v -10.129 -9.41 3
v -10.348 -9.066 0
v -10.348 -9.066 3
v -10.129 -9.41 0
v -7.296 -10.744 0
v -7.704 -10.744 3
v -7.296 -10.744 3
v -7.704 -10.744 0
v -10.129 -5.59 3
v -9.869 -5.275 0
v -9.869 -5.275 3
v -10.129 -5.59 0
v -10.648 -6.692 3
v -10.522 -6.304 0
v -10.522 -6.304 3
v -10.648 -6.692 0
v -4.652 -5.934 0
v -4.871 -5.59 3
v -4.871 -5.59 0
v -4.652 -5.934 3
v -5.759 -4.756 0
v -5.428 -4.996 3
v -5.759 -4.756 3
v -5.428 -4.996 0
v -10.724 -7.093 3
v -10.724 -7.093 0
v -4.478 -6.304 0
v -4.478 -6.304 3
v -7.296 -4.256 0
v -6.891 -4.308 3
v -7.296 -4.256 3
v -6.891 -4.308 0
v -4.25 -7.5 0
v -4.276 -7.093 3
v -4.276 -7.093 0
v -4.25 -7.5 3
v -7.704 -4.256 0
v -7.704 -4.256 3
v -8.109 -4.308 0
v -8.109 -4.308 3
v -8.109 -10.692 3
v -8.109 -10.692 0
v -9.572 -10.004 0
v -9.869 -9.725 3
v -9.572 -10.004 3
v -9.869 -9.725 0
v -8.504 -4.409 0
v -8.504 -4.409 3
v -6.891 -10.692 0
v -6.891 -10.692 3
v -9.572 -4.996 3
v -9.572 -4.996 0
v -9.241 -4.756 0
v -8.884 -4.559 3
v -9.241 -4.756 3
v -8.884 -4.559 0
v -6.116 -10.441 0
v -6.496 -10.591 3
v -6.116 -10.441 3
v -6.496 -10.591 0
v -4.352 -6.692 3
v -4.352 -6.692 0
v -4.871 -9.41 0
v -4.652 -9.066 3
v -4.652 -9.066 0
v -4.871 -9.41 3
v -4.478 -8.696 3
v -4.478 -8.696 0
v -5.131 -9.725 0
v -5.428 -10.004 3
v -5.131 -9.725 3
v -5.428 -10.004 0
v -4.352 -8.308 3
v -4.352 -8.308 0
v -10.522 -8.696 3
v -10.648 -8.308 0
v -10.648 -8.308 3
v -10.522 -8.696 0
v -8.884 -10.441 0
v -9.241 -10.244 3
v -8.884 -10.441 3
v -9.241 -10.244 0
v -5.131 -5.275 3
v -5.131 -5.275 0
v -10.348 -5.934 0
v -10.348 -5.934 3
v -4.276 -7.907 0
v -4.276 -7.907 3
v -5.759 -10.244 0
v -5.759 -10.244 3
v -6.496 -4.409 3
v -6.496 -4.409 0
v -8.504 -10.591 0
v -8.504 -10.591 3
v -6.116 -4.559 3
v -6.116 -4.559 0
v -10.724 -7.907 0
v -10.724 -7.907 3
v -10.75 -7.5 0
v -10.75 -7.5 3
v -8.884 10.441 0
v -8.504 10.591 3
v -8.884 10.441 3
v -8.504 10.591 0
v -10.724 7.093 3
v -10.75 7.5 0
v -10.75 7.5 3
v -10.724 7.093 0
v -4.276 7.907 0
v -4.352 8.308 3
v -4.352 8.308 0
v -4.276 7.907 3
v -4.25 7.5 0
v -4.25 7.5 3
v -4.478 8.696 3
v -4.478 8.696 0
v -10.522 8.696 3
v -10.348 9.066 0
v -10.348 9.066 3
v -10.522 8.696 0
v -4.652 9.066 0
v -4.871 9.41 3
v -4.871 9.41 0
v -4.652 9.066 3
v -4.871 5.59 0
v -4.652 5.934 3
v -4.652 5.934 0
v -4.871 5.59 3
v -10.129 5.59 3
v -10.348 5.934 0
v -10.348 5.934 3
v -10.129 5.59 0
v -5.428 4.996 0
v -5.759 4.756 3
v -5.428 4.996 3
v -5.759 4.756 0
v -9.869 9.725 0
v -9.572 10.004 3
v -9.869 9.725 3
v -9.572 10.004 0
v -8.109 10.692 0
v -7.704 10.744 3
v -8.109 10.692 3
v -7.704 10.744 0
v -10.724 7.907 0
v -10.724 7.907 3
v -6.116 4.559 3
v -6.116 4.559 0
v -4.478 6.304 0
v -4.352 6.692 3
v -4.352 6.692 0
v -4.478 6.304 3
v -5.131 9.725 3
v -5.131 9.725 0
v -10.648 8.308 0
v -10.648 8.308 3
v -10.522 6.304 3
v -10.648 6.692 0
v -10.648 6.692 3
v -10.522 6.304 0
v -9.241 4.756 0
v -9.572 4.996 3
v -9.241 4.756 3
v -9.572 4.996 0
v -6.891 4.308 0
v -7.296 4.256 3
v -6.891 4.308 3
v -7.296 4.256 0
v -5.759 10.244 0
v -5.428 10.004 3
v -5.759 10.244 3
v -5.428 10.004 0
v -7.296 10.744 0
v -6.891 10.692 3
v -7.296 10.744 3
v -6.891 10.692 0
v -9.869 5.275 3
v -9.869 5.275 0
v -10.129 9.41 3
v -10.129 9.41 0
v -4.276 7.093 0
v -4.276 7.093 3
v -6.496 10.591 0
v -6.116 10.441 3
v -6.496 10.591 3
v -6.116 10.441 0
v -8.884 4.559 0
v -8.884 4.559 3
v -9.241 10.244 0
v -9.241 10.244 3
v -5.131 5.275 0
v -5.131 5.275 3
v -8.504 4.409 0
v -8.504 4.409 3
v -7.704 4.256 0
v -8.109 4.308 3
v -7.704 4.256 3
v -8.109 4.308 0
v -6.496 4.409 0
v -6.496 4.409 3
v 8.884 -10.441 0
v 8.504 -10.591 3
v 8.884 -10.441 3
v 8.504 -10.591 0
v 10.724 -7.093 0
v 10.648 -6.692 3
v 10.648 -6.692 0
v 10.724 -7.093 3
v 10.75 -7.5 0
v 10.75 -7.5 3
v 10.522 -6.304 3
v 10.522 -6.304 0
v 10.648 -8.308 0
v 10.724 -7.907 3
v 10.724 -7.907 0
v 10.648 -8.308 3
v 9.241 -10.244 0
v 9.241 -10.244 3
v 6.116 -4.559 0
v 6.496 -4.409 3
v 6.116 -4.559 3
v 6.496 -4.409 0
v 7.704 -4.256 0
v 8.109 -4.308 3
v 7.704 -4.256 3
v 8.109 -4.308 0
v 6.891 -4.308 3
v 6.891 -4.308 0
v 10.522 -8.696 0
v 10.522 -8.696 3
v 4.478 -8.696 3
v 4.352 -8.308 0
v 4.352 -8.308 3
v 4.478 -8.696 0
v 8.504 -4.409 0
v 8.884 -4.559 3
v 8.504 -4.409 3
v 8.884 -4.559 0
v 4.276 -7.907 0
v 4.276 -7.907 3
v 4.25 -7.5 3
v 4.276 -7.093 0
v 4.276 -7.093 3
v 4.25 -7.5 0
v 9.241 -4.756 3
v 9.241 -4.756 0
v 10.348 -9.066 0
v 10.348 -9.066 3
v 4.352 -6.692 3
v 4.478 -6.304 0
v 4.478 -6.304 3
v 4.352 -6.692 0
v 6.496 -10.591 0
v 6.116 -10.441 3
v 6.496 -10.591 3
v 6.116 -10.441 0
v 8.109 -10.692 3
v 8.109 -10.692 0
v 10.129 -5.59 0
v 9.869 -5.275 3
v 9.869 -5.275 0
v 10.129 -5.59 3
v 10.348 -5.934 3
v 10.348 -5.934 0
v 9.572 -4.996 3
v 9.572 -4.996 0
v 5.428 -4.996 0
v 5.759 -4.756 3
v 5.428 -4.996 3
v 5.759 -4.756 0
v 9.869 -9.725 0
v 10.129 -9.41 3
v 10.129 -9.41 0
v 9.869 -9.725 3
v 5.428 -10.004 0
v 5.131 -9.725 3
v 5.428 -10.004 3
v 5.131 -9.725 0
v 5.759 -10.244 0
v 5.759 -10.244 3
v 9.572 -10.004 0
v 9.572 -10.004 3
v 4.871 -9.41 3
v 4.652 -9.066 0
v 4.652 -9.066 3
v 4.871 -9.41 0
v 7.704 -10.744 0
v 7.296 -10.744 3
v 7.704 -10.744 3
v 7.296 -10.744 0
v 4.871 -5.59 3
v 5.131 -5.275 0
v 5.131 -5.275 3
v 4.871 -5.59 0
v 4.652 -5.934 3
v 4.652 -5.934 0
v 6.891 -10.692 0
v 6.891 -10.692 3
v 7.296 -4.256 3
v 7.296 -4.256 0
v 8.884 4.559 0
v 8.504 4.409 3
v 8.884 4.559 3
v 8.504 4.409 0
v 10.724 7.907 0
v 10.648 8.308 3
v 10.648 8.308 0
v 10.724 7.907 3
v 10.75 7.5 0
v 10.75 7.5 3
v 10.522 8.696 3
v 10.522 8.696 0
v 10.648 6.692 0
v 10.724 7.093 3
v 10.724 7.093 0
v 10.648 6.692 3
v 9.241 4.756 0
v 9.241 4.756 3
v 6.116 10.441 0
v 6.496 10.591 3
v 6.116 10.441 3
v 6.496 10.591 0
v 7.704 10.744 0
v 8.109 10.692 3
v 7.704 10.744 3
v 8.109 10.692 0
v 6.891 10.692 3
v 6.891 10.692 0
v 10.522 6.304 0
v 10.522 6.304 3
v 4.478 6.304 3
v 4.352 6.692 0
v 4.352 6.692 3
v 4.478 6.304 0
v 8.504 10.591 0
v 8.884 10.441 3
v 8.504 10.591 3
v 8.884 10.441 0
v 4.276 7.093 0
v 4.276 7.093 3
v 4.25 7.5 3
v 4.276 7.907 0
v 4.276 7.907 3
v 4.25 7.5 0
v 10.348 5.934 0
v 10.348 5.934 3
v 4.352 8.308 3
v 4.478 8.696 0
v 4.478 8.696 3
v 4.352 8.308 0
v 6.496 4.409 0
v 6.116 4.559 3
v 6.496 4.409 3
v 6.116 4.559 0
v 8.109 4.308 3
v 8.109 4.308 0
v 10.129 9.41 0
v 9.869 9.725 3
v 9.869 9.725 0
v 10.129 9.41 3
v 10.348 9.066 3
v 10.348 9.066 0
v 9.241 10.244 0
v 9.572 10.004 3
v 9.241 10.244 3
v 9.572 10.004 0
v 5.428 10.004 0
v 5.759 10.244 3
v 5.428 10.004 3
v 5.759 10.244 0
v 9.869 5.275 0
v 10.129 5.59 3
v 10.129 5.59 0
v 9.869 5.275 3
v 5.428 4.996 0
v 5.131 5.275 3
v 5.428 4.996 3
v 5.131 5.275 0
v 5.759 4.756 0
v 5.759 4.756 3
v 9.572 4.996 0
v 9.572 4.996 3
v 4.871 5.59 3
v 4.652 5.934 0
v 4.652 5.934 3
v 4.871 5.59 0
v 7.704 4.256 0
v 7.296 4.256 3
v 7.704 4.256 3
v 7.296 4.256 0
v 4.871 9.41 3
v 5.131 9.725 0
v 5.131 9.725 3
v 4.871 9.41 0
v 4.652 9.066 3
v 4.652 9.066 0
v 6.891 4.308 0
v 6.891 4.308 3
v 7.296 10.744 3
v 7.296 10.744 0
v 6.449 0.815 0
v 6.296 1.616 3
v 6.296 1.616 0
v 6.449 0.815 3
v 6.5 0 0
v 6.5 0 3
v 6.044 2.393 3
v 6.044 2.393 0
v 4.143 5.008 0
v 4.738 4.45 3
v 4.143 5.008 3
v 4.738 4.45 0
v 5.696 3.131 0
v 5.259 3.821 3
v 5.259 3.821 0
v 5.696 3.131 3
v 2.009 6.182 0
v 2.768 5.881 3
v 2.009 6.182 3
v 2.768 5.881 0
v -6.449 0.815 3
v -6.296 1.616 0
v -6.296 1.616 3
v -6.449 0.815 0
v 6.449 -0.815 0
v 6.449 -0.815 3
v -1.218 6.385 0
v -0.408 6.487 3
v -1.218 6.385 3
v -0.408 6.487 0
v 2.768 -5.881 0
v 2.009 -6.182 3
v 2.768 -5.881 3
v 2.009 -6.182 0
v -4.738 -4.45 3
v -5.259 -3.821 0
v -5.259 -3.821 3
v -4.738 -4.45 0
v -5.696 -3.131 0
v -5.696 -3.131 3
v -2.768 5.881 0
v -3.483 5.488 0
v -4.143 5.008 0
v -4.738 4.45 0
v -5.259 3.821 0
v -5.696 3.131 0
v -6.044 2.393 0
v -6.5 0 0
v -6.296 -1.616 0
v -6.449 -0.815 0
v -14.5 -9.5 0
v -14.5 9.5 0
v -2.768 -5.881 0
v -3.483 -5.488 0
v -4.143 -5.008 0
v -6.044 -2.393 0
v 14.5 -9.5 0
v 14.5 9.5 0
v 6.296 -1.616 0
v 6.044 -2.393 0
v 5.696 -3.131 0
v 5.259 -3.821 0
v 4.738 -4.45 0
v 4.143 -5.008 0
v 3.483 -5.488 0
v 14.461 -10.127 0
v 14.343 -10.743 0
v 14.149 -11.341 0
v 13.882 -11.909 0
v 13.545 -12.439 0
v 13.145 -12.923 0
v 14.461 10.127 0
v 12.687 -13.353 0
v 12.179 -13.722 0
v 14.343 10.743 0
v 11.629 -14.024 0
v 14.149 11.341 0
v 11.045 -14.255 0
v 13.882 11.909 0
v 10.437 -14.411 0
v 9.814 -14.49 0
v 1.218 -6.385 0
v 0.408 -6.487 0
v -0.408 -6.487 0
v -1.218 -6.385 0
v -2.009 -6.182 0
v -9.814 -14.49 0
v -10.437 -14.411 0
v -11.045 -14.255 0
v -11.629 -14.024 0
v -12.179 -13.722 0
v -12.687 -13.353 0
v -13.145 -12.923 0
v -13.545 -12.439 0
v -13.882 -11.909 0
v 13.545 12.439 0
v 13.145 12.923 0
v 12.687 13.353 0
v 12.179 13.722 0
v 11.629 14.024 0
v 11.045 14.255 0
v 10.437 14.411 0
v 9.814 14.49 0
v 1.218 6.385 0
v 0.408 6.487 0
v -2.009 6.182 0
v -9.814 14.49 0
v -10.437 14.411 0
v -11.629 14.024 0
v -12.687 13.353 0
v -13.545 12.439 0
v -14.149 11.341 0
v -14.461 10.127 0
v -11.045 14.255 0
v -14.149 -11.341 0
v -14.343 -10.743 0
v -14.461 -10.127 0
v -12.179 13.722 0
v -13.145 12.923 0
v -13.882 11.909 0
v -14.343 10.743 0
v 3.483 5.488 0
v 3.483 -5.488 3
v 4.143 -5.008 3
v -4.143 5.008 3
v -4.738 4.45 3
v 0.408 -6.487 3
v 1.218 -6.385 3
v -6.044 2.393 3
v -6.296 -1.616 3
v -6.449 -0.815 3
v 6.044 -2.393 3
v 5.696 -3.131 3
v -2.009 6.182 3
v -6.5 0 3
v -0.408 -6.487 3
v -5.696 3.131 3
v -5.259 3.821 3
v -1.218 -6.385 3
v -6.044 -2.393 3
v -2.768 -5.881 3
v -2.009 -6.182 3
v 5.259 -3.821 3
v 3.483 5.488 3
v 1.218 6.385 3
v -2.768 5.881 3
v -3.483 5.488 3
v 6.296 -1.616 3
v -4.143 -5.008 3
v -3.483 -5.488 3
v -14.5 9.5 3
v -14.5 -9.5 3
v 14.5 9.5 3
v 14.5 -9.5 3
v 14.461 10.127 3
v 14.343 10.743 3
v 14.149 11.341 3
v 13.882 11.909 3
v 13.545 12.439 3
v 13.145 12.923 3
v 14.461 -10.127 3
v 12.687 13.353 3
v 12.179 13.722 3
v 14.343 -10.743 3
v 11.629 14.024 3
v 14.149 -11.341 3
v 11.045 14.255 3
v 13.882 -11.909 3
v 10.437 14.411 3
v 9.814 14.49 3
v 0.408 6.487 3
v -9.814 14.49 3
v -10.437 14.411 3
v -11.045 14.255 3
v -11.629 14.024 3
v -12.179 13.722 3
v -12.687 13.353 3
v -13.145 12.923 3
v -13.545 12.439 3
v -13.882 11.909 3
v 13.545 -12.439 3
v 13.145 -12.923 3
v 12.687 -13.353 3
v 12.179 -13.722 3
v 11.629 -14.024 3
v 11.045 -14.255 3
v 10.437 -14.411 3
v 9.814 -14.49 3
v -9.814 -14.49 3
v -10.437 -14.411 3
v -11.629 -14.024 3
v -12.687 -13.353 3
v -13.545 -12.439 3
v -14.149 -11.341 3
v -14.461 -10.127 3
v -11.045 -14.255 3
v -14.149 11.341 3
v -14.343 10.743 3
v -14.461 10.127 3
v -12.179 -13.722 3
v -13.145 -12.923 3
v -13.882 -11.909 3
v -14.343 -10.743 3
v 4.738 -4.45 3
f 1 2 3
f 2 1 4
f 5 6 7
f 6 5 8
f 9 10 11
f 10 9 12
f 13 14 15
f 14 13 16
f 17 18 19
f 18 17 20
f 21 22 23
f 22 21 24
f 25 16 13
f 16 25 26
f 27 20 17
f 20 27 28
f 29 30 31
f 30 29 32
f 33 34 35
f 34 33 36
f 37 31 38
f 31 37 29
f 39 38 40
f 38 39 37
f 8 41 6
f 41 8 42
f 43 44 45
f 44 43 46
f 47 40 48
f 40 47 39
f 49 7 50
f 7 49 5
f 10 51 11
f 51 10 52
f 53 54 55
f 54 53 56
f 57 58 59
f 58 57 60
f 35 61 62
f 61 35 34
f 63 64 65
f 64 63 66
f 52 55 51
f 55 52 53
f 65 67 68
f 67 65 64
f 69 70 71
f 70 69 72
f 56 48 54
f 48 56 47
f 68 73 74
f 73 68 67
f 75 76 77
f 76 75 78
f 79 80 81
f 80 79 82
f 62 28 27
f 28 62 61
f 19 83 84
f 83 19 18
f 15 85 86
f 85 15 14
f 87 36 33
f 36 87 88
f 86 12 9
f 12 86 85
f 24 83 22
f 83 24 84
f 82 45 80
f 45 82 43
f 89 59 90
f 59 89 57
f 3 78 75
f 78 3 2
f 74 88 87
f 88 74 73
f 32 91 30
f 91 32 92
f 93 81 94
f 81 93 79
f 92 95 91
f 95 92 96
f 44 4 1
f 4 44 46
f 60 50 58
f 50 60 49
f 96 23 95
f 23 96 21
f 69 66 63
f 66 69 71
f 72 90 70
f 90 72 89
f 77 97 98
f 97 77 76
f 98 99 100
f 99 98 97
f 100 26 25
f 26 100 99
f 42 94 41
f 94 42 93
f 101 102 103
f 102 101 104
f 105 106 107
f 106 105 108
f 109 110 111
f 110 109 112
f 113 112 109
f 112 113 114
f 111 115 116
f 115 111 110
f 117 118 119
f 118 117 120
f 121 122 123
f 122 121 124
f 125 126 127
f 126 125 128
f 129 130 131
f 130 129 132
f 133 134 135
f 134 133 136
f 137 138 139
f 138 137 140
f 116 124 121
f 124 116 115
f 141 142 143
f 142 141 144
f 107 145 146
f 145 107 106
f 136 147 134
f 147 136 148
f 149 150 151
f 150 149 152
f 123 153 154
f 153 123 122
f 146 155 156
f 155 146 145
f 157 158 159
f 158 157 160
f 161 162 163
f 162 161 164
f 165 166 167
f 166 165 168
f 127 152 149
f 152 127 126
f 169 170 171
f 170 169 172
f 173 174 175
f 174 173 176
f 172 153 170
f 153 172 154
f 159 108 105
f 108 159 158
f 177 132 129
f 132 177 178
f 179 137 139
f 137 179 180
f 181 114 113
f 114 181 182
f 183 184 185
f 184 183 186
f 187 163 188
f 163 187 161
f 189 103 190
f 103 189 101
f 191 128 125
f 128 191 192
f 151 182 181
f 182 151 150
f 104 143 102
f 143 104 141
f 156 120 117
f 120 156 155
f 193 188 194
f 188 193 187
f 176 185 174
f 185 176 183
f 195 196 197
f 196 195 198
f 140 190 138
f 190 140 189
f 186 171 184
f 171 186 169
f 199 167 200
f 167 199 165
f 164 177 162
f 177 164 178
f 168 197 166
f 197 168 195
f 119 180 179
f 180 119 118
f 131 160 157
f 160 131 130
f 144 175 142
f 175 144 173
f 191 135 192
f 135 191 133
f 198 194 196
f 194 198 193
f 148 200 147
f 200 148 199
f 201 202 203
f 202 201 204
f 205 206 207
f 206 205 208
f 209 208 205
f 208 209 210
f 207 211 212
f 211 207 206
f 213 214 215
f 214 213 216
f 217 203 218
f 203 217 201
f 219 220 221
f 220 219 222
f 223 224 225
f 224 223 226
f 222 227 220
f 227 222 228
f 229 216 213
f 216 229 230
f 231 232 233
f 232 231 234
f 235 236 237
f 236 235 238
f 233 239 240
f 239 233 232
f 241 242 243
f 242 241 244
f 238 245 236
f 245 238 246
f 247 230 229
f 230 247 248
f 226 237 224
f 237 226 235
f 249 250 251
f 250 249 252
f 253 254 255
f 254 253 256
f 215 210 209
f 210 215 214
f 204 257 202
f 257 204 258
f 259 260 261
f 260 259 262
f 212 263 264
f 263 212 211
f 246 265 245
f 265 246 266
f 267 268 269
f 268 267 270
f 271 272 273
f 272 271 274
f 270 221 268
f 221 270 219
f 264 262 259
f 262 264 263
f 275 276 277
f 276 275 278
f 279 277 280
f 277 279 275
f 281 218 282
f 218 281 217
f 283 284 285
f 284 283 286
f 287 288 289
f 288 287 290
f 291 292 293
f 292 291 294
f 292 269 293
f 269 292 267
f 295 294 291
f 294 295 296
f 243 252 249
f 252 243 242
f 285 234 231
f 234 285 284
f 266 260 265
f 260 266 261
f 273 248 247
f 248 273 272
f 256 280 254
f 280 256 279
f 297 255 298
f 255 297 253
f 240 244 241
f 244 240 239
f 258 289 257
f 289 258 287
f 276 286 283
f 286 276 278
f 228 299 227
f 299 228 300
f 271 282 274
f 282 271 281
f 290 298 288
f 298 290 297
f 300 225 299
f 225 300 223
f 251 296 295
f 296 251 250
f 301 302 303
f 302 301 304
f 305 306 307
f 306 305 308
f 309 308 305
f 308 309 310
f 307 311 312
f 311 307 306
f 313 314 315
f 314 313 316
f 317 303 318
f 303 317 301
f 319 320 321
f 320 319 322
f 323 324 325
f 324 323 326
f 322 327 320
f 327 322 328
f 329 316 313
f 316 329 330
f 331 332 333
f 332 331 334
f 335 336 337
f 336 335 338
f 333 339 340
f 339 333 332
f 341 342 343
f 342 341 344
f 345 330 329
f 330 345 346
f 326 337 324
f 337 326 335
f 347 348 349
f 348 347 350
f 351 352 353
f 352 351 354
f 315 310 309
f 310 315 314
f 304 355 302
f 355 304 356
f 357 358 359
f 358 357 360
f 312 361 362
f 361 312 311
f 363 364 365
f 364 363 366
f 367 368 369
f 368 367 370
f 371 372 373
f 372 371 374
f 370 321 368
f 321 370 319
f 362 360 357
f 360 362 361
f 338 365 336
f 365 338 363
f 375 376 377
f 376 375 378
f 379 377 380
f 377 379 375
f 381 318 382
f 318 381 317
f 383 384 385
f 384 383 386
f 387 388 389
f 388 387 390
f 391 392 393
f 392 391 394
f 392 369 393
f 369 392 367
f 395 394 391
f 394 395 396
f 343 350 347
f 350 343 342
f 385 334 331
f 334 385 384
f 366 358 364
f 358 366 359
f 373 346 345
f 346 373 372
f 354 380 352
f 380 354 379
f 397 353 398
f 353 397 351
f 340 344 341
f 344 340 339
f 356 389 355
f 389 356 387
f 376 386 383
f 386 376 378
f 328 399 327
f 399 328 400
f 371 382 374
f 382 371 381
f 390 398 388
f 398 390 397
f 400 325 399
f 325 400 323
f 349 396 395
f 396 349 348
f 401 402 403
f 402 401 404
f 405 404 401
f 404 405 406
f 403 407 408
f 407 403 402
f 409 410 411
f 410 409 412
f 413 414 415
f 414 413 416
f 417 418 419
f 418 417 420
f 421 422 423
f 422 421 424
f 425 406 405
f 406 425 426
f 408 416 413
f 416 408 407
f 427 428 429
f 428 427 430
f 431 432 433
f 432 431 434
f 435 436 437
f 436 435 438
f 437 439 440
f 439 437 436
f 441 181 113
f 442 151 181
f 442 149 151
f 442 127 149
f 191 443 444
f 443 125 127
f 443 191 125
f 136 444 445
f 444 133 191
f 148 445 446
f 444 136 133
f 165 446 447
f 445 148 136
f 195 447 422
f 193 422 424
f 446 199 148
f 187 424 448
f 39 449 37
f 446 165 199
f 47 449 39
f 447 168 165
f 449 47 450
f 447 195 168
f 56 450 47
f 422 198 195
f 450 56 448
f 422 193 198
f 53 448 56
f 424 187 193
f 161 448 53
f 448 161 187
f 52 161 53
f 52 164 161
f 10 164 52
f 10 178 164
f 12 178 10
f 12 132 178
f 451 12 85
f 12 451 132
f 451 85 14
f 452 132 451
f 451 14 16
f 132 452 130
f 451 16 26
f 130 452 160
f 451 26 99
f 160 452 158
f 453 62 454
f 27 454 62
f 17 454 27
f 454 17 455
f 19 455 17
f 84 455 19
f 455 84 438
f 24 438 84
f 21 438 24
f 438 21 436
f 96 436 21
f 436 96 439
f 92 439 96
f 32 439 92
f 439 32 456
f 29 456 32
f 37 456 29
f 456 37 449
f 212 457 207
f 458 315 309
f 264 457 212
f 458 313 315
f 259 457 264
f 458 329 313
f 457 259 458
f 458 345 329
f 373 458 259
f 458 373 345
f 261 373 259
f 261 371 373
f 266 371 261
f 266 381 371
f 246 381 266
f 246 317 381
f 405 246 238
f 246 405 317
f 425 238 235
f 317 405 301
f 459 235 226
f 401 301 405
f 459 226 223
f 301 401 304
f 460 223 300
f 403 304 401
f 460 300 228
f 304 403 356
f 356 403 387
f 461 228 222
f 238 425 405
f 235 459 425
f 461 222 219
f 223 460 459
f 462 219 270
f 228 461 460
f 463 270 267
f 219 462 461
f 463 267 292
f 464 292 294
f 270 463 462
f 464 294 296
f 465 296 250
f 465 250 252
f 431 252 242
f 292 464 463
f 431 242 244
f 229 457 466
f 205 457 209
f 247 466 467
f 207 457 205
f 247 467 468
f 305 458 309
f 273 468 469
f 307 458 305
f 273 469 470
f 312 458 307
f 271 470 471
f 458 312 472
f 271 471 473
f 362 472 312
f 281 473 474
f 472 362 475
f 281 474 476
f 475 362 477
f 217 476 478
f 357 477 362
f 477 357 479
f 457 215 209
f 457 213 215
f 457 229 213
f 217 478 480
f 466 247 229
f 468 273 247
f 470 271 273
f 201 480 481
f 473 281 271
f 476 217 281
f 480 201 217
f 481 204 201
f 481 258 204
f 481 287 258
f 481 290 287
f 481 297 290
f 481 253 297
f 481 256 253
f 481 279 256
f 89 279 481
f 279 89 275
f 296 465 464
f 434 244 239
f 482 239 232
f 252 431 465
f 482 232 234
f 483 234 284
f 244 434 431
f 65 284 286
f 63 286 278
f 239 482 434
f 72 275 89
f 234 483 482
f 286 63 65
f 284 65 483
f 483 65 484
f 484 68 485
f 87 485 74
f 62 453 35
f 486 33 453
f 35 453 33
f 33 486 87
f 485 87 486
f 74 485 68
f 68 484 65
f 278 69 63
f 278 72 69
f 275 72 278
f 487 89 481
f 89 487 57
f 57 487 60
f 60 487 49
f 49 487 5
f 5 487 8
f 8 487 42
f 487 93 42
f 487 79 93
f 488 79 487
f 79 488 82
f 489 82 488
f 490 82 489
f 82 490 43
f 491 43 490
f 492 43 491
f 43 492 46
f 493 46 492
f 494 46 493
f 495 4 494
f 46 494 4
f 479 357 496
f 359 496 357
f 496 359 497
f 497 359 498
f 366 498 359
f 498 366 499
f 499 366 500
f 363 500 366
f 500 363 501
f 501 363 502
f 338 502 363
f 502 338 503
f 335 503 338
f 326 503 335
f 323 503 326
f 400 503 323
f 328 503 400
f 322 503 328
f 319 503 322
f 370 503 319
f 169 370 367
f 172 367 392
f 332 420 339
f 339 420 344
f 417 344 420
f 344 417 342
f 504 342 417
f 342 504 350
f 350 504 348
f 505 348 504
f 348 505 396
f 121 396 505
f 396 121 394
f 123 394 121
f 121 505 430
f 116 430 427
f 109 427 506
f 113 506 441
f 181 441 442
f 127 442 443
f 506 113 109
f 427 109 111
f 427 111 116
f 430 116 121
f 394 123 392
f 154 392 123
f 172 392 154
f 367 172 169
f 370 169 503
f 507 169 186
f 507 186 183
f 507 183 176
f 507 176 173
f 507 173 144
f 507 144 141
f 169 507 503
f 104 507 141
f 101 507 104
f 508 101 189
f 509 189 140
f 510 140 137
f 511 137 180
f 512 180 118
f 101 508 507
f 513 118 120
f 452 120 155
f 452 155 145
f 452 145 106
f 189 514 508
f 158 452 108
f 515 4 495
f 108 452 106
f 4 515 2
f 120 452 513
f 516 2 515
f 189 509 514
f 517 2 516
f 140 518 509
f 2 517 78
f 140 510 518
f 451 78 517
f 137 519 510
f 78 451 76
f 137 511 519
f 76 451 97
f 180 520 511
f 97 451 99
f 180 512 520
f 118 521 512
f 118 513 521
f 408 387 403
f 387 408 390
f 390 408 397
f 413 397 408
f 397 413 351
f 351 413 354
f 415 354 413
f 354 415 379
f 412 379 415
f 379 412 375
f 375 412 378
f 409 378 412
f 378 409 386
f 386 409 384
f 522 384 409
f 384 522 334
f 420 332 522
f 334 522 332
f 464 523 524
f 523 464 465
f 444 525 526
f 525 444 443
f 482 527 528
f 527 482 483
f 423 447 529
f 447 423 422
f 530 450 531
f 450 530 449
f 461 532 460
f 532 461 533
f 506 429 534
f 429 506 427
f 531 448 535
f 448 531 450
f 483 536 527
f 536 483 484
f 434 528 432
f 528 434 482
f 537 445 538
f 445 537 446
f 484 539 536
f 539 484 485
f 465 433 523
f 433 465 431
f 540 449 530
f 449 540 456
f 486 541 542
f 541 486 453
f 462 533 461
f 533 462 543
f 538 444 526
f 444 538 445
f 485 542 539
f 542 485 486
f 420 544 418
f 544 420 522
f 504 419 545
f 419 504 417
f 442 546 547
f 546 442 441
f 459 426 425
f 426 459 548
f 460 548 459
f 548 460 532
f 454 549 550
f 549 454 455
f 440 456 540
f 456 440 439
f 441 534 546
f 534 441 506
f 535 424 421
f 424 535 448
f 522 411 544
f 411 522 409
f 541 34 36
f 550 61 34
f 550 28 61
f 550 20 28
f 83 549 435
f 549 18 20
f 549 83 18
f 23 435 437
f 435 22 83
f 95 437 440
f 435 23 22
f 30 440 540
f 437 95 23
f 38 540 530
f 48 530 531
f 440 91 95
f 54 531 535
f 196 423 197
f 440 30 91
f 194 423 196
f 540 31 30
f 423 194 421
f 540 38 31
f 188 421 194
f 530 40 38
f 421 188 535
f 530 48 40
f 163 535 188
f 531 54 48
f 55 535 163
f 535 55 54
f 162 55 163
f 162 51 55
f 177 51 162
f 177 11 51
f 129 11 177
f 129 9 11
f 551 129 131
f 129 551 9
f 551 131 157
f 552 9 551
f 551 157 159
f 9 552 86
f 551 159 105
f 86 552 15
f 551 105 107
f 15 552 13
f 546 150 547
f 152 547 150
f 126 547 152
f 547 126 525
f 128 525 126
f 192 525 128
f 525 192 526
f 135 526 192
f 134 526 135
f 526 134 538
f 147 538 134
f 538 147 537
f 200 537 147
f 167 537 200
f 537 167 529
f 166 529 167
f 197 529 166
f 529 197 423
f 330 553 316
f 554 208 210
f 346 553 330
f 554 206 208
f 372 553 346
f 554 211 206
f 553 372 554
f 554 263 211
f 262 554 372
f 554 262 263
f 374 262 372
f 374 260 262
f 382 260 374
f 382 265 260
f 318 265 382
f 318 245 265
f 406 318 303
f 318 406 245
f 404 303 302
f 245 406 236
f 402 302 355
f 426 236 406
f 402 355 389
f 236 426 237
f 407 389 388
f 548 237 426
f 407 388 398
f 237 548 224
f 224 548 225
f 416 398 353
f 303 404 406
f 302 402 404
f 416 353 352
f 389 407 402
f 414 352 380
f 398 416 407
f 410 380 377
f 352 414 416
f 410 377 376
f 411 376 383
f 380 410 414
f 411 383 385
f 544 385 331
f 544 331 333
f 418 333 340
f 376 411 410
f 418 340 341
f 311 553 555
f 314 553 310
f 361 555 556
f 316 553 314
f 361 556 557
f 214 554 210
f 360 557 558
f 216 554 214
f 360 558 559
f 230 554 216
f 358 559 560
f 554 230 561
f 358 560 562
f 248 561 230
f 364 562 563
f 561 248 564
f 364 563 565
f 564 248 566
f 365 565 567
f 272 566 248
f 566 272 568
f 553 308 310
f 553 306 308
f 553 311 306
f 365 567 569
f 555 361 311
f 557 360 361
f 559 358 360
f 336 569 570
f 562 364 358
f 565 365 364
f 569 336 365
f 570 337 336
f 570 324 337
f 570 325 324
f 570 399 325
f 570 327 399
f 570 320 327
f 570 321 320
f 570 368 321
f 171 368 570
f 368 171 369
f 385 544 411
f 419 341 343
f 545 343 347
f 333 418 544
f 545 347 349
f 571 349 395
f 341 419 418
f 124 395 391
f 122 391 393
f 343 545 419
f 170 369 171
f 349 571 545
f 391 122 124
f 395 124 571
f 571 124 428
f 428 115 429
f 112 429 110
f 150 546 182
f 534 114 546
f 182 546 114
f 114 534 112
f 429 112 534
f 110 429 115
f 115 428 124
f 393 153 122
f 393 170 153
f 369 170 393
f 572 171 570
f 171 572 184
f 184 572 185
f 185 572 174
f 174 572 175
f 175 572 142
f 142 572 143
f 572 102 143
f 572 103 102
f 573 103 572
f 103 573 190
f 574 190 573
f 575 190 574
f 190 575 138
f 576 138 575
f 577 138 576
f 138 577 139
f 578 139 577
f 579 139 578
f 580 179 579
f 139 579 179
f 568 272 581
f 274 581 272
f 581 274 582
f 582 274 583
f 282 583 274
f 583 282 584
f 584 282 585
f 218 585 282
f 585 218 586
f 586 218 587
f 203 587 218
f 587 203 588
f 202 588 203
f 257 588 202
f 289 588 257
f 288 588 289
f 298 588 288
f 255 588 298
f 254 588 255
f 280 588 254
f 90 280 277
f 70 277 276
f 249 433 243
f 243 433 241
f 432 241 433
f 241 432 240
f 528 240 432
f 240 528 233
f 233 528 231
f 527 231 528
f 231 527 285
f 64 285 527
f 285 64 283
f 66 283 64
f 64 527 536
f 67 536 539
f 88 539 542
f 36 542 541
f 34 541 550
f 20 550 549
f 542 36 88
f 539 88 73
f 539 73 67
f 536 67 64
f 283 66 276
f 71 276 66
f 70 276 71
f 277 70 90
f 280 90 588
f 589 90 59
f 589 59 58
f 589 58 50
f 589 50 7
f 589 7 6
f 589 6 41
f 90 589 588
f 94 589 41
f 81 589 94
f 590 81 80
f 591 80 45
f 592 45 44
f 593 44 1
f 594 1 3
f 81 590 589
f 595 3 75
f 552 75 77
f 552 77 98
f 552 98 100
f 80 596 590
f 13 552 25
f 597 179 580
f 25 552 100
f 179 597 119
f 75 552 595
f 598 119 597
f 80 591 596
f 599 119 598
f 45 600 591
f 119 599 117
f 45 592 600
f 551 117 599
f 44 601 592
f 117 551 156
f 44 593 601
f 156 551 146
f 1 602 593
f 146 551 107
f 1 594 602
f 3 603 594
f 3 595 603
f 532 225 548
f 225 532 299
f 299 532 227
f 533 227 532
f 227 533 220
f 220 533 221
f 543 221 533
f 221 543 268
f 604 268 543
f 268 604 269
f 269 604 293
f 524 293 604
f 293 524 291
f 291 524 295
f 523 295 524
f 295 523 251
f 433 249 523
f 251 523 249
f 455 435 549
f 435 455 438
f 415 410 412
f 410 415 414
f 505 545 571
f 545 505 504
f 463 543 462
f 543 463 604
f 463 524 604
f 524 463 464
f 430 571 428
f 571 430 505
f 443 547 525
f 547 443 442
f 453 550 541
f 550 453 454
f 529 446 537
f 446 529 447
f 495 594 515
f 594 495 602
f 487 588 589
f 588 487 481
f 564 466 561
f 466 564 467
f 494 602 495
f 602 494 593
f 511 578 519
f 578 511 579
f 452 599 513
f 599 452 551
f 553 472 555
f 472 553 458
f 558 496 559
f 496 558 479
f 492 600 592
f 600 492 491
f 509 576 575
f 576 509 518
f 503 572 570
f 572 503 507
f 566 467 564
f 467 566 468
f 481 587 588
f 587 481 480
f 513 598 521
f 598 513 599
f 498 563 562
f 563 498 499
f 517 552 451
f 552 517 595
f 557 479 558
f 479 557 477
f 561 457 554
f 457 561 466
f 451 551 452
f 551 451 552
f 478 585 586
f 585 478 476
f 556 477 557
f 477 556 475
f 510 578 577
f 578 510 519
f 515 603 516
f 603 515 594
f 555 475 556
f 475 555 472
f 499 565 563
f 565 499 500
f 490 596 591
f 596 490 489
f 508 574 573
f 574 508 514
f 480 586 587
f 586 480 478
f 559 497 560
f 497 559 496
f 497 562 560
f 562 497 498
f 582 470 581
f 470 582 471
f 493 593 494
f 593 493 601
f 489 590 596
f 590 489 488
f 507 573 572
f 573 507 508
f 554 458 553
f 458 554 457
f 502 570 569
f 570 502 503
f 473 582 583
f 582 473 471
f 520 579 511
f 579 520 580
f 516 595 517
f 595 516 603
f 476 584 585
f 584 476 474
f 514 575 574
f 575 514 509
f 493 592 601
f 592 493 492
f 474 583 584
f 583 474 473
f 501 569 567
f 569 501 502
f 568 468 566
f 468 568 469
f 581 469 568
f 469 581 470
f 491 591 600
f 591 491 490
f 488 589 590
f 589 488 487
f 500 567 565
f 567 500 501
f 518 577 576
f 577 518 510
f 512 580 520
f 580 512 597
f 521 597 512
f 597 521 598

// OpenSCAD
$fn = 50;


difference() {
	union() {
		hull() {
			translate(v = [-9.5000000000, 9.5000000000, 0]) {
				cylinder(h = 3, r = 5);
			}
			translate(v = [9.5000000000, 9.5000000000, 0]) {
				cylinder(h = 3, r = 5);
			}
			translate(v = [-9.5000000000, -9.5000000000, 0]) {
				cylinder(h = 3, r = 5);
			}
			translate(v = [9.5000000000, -9.5000000000, 0]) {
				cylinder(h = 3, r = 5);
			}
		}
	}
	union() {
		#translate(v = [-7.5000000000, -7.5000000000, -100.0000000000]) {
			cylinder(h = 200, r = 3.2500000000);
		}
		#translate(v = [-7.5000000000, 7.5000000000, -100.0000000000]) {
			cylinder(h = 200, r = 3.2500000000);
		}
		#translate(v = [7.5000000000, -7.5000000000, -100.0000000000]) {
			cylinder(h = 200, r = 3.2500000000);
		}
		#translate(v = [7.5000000000, 7.5000000000, -100.0000000000]) {
			cylinder(h = 200, r = 3.2500000000);
		}
		#cylinder(h = 3, r = 6.5000000000);
	}
}
